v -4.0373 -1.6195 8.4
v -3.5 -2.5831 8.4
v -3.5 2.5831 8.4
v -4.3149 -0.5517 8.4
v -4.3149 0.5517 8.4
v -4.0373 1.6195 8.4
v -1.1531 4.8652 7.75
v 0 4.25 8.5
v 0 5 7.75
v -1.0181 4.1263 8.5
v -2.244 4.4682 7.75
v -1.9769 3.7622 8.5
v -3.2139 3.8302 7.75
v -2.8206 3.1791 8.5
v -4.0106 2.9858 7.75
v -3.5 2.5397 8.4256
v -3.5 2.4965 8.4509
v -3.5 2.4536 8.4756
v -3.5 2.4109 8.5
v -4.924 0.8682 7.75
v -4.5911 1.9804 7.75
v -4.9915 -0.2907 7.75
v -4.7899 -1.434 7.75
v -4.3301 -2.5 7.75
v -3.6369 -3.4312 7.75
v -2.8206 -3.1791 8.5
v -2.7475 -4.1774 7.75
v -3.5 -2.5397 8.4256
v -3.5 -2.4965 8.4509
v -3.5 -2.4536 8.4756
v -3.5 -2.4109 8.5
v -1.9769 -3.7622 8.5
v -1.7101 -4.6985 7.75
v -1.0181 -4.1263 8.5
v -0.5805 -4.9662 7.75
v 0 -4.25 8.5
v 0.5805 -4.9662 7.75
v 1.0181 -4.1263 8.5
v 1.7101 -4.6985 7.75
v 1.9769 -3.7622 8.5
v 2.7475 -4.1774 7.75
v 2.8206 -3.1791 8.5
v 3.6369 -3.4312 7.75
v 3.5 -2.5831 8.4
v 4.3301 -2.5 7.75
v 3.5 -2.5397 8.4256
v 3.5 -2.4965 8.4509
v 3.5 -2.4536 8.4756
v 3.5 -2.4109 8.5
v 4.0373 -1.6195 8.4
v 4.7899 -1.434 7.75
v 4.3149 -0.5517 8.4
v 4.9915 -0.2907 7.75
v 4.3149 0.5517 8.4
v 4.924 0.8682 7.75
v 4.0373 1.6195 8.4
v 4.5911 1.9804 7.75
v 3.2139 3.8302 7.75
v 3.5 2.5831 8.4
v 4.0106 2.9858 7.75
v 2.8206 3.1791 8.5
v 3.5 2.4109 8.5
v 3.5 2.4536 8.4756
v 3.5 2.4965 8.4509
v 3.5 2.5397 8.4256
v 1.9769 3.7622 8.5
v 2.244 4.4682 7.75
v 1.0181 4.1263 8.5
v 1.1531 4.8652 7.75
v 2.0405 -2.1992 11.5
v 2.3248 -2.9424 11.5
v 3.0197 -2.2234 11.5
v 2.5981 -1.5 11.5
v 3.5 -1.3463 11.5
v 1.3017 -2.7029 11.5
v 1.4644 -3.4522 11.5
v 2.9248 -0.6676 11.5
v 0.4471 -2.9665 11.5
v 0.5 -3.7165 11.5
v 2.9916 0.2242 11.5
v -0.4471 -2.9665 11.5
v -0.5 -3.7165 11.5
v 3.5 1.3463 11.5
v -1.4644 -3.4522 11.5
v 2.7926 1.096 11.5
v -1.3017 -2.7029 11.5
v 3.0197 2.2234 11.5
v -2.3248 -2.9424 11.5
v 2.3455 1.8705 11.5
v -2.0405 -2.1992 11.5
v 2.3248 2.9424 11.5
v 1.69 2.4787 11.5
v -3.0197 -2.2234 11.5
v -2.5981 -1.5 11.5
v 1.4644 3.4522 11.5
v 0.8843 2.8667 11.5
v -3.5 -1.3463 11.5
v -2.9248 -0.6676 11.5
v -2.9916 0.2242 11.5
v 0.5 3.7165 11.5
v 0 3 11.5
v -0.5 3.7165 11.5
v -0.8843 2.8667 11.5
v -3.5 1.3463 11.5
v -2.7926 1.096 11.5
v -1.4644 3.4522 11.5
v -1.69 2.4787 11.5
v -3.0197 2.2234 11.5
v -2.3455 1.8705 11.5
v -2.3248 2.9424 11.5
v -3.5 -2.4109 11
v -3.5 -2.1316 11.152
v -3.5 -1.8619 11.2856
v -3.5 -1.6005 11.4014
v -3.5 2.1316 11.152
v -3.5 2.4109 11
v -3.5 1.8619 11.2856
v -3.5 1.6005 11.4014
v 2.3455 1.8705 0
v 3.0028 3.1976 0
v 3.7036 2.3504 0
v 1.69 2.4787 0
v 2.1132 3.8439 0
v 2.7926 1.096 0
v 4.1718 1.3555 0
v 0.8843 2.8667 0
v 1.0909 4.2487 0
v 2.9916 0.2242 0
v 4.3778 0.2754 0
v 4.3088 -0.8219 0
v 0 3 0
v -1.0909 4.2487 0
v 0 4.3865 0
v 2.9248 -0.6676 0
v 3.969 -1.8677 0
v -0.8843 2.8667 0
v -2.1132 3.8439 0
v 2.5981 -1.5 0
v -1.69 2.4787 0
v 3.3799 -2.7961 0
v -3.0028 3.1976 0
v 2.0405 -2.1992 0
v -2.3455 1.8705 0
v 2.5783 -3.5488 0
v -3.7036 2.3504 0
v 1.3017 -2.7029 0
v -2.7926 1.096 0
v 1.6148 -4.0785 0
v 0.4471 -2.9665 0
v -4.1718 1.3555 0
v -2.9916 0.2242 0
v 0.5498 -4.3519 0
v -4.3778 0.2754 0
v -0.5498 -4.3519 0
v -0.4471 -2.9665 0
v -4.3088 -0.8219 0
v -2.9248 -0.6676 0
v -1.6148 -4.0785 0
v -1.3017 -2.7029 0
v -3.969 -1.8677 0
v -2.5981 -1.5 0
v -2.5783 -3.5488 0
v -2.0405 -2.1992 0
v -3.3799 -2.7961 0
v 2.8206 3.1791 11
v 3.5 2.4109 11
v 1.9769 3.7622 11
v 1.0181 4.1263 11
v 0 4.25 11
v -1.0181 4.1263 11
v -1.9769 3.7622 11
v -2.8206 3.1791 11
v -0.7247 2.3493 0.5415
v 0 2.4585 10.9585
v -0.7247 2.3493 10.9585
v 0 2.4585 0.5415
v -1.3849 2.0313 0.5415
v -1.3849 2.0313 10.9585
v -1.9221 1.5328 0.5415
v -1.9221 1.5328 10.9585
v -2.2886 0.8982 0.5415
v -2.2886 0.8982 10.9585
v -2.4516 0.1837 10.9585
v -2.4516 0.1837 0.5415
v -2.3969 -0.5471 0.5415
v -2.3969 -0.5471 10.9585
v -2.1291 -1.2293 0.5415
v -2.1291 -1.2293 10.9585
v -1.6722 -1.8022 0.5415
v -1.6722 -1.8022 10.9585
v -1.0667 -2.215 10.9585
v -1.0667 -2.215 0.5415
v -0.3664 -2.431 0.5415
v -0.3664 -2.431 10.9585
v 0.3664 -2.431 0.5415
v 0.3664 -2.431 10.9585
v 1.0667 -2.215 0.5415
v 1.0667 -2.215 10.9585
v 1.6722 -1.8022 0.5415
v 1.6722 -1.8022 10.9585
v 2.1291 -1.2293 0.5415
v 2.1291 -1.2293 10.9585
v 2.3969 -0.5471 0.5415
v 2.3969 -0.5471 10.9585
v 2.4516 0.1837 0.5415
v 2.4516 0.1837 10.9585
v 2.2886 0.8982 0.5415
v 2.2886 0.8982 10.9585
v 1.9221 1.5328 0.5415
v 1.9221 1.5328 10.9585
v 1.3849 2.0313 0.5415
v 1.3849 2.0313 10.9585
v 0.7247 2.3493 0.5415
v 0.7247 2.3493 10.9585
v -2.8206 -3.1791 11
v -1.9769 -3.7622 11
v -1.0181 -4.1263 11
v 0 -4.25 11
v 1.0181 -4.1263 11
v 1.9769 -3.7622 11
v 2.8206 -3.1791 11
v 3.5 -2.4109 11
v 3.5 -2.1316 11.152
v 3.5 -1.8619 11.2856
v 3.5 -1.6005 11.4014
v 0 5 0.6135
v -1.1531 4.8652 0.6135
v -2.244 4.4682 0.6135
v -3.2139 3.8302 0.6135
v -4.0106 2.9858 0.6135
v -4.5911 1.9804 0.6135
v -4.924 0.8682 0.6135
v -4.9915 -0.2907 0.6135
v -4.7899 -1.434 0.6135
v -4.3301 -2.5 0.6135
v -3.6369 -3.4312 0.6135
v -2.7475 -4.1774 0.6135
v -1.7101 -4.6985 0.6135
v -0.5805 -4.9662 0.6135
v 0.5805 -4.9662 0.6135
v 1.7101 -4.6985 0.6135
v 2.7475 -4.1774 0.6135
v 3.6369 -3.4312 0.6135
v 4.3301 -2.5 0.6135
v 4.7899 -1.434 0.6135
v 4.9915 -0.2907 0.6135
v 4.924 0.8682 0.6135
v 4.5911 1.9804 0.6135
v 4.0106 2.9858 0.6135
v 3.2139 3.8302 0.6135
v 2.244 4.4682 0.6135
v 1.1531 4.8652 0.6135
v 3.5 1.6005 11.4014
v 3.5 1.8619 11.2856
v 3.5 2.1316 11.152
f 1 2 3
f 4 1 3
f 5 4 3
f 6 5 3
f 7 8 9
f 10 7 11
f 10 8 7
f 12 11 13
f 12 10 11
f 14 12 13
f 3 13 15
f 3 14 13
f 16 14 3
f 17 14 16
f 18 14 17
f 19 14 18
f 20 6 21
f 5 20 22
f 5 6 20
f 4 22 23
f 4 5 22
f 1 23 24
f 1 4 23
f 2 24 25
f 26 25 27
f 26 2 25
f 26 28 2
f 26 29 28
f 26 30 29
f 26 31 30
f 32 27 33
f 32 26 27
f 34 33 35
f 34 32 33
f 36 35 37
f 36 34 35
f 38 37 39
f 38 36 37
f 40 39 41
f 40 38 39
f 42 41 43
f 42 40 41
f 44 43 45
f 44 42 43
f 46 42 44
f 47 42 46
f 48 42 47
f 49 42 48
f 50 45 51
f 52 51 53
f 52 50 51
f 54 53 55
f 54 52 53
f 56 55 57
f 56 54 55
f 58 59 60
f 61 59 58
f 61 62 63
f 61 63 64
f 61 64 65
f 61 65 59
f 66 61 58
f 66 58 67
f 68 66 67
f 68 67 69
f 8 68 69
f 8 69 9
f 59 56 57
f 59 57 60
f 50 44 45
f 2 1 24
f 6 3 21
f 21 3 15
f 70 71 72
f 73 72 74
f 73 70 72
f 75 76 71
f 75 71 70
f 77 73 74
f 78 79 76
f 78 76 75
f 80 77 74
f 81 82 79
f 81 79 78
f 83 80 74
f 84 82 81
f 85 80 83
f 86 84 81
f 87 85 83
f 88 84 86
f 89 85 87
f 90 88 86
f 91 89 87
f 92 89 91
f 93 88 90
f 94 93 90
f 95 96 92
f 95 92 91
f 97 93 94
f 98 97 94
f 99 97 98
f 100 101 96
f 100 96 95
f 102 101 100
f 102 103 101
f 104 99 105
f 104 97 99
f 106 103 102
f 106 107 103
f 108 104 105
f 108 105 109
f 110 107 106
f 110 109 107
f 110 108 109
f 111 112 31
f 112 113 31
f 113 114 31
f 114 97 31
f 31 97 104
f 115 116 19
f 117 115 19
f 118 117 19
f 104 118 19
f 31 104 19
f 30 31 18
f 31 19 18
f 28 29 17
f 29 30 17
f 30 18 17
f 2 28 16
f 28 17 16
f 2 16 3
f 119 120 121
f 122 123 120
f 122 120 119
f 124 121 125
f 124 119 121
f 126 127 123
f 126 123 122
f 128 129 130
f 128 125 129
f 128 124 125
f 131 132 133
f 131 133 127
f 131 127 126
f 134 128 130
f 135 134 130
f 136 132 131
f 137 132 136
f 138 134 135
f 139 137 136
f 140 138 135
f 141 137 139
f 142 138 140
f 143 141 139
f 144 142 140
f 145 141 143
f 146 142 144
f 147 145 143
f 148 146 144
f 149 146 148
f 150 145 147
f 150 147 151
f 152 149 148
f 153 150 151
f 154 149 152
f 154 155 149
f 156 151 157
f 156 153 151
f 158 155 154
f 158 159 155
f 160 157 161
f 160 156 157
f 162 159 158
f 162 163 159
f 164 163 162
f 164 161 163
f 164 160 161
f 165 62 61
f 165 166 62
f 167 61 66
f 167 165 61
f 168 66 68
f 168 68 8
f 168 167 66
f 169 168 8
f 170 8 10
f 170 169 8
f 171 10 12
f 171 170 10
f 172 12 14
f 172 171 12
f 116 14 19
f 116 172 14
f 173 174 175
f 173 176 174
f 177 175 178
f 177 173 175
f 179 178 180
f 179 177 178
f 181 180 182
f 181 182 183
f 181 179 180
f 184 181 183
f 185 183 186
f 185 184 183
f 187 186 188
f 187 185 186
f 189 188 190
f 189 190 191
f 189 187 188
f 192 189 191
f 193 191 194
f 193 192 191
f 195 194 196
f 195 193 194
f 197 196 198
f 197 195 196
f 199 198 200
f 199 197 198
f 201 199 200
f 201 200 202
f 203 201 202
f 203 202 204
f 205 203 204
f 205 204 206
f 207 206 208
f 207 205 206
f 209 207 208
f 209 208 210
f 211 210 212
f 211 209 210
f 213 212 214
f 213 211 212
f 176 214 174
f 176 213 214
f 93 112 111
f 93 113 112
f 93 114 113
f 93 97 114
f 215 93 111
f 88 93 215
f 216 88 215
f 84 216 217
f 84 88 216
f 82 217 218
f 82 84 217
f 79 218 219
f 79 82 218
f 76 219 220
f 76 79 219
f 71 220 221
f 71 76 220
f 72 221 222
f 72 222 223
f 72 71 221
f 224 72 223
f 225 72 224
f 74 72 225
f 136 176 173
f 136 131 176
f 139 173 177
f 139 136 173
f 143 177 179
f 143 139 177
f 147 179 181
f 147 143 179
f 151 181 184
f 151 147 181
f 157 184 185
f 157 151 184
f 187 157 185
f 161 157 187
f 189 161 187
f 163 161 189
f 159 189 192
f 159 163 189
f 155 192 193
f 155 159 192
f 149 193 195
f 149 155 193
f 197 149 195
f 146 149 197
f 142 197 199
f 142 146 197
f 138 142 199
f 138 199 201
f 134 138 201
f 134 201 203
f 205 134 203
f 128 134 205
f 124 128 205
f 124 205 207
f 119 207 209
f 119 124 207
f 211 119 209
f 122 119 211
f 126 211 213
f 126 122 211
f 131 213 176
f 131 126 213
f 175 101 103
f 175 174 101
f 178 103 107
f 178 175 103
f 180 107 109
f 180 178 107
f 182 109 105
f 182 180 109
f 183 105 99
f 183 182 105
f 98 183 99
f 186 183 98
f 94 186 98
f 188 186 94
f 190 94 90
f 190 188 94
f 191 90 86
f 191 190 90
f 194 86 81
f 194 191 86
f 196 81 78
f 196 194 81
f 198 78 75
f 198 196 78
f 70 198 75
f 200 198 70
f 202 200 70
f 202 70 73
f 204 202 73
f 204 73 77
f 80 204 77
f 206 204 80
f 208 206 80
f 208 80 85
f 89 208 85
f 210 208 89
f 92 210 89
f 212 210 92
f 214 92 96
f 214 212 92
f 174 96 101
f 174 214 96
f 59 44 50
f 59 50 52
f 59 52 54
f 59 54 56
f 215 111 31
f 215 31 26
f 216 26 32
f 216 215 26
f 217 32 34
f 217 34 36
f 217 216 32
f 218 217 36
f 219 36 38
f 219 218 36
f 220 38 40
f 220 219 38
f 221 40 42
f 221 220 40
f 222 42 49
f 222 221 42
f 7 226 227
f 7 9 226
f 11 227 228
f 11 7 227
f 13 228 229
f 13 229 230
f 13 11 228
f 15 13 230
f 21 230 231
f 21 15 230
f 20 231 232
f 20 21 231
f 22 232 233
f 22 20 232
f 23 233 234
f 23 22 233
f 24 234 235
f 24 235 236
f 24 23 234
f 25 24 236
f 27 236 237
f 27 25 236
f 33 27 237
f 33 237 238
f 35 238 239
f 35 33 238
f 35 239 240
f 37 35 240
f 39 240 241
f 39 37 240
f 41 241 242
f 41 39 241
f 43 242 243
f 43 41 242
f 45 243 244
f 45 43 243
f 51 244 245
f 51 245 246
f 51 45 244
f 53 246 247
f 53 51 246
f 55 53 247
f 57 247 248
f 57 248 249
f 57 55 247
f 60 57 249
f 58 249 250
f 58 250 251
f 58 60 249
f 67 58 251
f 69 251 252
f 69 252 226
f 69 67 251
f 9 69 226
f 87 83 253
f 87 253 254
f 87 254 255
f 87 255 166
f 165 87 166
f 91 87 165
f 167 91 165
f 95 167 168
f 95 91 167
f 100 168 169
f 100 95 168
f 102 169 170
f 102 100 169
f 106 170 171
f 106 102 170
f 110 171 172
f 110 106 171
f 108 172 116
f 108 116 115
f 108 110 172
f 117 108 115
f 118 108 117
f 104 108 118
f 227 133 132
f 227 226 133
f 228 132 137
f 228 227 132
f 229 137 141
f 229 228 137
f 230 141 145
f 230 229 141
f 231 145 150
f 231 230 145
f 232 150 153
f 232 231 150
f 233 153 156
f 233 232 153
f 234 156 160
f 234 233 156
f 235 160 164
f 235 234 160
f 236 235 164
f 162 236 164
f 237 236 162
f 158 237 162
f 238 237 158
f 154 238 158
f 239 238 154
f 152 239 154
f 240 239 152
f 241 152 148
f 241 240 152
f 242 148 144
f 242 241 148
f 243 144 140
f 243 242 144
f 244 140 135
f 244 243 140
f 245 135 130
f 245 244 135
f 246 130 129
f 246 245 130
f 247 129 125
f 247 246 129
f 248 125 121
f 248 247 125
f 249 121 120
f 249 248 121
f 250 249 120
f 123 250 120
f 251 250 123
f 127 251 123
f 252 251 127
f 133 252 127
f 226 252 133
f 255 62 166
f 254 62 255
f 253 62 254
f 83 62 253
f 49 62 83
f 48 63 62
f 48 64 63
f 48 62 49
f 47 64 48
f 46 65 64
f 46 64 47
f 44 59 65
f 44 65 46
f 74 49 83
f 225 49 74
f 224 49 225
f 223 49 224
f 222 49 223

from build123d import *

# Parameters (mm, degrees)
SCHNITT_LINEAR_AUSTRAGEN1_DEPTH      = 30
SCHNITT_LINEAR_AUSTRAGEN1_DEPTH_BACK = 30


with BuildPart() as part:
    # Skizze1 → Rotation1 (revolve)
    with BuildSketch(Plane(origin=(0, 0, 0), x_dir=(0, 0, -1), z_dir=(1, 0, 0))):
        Polygon((-11.5, 3.75), (-11.5, 3), (-10.9585, 2.4585), (-0.5415, 2.4585), (0, 3), (0, 4.3865), (-0.6135, 5), (-7.75, 5), (-8.5, 4.25), (-11, 4.25), align=None)
    revolve(axis=Axis((0, 0, 0), (0, 0, 1)))

    # Skizze2 → Schnitt-Linear austragen1 (cut, two sides: drawn at the far end of the back side and taken through both)
    with BuildSketch(Plane(origin=(0, 0, 0), x_dir=(1, 0, 0), z_dir=(0, 1, 0)).offset(-SCHNITT_LINEAR_AUSTRAGEN1_DEPTH_BACK)):
        Polygon((-13.5, -23.4), (13.5, -23.4), (13.5, -8.4), (3.5, -8.4), (3.5, -18.4), (-3.5, -18.4), (-3.5, -8.4), (-13.5, -8.4), align=None)
    extrude(amount=SCHNITT_LINEAR_AUSTRAGEN1_DEPTH + SCHNITT_LINEAR_AUSTRAGEN1_DEPTH_BACK, mode=Mode.SUBTRACT)


solid = part.part
